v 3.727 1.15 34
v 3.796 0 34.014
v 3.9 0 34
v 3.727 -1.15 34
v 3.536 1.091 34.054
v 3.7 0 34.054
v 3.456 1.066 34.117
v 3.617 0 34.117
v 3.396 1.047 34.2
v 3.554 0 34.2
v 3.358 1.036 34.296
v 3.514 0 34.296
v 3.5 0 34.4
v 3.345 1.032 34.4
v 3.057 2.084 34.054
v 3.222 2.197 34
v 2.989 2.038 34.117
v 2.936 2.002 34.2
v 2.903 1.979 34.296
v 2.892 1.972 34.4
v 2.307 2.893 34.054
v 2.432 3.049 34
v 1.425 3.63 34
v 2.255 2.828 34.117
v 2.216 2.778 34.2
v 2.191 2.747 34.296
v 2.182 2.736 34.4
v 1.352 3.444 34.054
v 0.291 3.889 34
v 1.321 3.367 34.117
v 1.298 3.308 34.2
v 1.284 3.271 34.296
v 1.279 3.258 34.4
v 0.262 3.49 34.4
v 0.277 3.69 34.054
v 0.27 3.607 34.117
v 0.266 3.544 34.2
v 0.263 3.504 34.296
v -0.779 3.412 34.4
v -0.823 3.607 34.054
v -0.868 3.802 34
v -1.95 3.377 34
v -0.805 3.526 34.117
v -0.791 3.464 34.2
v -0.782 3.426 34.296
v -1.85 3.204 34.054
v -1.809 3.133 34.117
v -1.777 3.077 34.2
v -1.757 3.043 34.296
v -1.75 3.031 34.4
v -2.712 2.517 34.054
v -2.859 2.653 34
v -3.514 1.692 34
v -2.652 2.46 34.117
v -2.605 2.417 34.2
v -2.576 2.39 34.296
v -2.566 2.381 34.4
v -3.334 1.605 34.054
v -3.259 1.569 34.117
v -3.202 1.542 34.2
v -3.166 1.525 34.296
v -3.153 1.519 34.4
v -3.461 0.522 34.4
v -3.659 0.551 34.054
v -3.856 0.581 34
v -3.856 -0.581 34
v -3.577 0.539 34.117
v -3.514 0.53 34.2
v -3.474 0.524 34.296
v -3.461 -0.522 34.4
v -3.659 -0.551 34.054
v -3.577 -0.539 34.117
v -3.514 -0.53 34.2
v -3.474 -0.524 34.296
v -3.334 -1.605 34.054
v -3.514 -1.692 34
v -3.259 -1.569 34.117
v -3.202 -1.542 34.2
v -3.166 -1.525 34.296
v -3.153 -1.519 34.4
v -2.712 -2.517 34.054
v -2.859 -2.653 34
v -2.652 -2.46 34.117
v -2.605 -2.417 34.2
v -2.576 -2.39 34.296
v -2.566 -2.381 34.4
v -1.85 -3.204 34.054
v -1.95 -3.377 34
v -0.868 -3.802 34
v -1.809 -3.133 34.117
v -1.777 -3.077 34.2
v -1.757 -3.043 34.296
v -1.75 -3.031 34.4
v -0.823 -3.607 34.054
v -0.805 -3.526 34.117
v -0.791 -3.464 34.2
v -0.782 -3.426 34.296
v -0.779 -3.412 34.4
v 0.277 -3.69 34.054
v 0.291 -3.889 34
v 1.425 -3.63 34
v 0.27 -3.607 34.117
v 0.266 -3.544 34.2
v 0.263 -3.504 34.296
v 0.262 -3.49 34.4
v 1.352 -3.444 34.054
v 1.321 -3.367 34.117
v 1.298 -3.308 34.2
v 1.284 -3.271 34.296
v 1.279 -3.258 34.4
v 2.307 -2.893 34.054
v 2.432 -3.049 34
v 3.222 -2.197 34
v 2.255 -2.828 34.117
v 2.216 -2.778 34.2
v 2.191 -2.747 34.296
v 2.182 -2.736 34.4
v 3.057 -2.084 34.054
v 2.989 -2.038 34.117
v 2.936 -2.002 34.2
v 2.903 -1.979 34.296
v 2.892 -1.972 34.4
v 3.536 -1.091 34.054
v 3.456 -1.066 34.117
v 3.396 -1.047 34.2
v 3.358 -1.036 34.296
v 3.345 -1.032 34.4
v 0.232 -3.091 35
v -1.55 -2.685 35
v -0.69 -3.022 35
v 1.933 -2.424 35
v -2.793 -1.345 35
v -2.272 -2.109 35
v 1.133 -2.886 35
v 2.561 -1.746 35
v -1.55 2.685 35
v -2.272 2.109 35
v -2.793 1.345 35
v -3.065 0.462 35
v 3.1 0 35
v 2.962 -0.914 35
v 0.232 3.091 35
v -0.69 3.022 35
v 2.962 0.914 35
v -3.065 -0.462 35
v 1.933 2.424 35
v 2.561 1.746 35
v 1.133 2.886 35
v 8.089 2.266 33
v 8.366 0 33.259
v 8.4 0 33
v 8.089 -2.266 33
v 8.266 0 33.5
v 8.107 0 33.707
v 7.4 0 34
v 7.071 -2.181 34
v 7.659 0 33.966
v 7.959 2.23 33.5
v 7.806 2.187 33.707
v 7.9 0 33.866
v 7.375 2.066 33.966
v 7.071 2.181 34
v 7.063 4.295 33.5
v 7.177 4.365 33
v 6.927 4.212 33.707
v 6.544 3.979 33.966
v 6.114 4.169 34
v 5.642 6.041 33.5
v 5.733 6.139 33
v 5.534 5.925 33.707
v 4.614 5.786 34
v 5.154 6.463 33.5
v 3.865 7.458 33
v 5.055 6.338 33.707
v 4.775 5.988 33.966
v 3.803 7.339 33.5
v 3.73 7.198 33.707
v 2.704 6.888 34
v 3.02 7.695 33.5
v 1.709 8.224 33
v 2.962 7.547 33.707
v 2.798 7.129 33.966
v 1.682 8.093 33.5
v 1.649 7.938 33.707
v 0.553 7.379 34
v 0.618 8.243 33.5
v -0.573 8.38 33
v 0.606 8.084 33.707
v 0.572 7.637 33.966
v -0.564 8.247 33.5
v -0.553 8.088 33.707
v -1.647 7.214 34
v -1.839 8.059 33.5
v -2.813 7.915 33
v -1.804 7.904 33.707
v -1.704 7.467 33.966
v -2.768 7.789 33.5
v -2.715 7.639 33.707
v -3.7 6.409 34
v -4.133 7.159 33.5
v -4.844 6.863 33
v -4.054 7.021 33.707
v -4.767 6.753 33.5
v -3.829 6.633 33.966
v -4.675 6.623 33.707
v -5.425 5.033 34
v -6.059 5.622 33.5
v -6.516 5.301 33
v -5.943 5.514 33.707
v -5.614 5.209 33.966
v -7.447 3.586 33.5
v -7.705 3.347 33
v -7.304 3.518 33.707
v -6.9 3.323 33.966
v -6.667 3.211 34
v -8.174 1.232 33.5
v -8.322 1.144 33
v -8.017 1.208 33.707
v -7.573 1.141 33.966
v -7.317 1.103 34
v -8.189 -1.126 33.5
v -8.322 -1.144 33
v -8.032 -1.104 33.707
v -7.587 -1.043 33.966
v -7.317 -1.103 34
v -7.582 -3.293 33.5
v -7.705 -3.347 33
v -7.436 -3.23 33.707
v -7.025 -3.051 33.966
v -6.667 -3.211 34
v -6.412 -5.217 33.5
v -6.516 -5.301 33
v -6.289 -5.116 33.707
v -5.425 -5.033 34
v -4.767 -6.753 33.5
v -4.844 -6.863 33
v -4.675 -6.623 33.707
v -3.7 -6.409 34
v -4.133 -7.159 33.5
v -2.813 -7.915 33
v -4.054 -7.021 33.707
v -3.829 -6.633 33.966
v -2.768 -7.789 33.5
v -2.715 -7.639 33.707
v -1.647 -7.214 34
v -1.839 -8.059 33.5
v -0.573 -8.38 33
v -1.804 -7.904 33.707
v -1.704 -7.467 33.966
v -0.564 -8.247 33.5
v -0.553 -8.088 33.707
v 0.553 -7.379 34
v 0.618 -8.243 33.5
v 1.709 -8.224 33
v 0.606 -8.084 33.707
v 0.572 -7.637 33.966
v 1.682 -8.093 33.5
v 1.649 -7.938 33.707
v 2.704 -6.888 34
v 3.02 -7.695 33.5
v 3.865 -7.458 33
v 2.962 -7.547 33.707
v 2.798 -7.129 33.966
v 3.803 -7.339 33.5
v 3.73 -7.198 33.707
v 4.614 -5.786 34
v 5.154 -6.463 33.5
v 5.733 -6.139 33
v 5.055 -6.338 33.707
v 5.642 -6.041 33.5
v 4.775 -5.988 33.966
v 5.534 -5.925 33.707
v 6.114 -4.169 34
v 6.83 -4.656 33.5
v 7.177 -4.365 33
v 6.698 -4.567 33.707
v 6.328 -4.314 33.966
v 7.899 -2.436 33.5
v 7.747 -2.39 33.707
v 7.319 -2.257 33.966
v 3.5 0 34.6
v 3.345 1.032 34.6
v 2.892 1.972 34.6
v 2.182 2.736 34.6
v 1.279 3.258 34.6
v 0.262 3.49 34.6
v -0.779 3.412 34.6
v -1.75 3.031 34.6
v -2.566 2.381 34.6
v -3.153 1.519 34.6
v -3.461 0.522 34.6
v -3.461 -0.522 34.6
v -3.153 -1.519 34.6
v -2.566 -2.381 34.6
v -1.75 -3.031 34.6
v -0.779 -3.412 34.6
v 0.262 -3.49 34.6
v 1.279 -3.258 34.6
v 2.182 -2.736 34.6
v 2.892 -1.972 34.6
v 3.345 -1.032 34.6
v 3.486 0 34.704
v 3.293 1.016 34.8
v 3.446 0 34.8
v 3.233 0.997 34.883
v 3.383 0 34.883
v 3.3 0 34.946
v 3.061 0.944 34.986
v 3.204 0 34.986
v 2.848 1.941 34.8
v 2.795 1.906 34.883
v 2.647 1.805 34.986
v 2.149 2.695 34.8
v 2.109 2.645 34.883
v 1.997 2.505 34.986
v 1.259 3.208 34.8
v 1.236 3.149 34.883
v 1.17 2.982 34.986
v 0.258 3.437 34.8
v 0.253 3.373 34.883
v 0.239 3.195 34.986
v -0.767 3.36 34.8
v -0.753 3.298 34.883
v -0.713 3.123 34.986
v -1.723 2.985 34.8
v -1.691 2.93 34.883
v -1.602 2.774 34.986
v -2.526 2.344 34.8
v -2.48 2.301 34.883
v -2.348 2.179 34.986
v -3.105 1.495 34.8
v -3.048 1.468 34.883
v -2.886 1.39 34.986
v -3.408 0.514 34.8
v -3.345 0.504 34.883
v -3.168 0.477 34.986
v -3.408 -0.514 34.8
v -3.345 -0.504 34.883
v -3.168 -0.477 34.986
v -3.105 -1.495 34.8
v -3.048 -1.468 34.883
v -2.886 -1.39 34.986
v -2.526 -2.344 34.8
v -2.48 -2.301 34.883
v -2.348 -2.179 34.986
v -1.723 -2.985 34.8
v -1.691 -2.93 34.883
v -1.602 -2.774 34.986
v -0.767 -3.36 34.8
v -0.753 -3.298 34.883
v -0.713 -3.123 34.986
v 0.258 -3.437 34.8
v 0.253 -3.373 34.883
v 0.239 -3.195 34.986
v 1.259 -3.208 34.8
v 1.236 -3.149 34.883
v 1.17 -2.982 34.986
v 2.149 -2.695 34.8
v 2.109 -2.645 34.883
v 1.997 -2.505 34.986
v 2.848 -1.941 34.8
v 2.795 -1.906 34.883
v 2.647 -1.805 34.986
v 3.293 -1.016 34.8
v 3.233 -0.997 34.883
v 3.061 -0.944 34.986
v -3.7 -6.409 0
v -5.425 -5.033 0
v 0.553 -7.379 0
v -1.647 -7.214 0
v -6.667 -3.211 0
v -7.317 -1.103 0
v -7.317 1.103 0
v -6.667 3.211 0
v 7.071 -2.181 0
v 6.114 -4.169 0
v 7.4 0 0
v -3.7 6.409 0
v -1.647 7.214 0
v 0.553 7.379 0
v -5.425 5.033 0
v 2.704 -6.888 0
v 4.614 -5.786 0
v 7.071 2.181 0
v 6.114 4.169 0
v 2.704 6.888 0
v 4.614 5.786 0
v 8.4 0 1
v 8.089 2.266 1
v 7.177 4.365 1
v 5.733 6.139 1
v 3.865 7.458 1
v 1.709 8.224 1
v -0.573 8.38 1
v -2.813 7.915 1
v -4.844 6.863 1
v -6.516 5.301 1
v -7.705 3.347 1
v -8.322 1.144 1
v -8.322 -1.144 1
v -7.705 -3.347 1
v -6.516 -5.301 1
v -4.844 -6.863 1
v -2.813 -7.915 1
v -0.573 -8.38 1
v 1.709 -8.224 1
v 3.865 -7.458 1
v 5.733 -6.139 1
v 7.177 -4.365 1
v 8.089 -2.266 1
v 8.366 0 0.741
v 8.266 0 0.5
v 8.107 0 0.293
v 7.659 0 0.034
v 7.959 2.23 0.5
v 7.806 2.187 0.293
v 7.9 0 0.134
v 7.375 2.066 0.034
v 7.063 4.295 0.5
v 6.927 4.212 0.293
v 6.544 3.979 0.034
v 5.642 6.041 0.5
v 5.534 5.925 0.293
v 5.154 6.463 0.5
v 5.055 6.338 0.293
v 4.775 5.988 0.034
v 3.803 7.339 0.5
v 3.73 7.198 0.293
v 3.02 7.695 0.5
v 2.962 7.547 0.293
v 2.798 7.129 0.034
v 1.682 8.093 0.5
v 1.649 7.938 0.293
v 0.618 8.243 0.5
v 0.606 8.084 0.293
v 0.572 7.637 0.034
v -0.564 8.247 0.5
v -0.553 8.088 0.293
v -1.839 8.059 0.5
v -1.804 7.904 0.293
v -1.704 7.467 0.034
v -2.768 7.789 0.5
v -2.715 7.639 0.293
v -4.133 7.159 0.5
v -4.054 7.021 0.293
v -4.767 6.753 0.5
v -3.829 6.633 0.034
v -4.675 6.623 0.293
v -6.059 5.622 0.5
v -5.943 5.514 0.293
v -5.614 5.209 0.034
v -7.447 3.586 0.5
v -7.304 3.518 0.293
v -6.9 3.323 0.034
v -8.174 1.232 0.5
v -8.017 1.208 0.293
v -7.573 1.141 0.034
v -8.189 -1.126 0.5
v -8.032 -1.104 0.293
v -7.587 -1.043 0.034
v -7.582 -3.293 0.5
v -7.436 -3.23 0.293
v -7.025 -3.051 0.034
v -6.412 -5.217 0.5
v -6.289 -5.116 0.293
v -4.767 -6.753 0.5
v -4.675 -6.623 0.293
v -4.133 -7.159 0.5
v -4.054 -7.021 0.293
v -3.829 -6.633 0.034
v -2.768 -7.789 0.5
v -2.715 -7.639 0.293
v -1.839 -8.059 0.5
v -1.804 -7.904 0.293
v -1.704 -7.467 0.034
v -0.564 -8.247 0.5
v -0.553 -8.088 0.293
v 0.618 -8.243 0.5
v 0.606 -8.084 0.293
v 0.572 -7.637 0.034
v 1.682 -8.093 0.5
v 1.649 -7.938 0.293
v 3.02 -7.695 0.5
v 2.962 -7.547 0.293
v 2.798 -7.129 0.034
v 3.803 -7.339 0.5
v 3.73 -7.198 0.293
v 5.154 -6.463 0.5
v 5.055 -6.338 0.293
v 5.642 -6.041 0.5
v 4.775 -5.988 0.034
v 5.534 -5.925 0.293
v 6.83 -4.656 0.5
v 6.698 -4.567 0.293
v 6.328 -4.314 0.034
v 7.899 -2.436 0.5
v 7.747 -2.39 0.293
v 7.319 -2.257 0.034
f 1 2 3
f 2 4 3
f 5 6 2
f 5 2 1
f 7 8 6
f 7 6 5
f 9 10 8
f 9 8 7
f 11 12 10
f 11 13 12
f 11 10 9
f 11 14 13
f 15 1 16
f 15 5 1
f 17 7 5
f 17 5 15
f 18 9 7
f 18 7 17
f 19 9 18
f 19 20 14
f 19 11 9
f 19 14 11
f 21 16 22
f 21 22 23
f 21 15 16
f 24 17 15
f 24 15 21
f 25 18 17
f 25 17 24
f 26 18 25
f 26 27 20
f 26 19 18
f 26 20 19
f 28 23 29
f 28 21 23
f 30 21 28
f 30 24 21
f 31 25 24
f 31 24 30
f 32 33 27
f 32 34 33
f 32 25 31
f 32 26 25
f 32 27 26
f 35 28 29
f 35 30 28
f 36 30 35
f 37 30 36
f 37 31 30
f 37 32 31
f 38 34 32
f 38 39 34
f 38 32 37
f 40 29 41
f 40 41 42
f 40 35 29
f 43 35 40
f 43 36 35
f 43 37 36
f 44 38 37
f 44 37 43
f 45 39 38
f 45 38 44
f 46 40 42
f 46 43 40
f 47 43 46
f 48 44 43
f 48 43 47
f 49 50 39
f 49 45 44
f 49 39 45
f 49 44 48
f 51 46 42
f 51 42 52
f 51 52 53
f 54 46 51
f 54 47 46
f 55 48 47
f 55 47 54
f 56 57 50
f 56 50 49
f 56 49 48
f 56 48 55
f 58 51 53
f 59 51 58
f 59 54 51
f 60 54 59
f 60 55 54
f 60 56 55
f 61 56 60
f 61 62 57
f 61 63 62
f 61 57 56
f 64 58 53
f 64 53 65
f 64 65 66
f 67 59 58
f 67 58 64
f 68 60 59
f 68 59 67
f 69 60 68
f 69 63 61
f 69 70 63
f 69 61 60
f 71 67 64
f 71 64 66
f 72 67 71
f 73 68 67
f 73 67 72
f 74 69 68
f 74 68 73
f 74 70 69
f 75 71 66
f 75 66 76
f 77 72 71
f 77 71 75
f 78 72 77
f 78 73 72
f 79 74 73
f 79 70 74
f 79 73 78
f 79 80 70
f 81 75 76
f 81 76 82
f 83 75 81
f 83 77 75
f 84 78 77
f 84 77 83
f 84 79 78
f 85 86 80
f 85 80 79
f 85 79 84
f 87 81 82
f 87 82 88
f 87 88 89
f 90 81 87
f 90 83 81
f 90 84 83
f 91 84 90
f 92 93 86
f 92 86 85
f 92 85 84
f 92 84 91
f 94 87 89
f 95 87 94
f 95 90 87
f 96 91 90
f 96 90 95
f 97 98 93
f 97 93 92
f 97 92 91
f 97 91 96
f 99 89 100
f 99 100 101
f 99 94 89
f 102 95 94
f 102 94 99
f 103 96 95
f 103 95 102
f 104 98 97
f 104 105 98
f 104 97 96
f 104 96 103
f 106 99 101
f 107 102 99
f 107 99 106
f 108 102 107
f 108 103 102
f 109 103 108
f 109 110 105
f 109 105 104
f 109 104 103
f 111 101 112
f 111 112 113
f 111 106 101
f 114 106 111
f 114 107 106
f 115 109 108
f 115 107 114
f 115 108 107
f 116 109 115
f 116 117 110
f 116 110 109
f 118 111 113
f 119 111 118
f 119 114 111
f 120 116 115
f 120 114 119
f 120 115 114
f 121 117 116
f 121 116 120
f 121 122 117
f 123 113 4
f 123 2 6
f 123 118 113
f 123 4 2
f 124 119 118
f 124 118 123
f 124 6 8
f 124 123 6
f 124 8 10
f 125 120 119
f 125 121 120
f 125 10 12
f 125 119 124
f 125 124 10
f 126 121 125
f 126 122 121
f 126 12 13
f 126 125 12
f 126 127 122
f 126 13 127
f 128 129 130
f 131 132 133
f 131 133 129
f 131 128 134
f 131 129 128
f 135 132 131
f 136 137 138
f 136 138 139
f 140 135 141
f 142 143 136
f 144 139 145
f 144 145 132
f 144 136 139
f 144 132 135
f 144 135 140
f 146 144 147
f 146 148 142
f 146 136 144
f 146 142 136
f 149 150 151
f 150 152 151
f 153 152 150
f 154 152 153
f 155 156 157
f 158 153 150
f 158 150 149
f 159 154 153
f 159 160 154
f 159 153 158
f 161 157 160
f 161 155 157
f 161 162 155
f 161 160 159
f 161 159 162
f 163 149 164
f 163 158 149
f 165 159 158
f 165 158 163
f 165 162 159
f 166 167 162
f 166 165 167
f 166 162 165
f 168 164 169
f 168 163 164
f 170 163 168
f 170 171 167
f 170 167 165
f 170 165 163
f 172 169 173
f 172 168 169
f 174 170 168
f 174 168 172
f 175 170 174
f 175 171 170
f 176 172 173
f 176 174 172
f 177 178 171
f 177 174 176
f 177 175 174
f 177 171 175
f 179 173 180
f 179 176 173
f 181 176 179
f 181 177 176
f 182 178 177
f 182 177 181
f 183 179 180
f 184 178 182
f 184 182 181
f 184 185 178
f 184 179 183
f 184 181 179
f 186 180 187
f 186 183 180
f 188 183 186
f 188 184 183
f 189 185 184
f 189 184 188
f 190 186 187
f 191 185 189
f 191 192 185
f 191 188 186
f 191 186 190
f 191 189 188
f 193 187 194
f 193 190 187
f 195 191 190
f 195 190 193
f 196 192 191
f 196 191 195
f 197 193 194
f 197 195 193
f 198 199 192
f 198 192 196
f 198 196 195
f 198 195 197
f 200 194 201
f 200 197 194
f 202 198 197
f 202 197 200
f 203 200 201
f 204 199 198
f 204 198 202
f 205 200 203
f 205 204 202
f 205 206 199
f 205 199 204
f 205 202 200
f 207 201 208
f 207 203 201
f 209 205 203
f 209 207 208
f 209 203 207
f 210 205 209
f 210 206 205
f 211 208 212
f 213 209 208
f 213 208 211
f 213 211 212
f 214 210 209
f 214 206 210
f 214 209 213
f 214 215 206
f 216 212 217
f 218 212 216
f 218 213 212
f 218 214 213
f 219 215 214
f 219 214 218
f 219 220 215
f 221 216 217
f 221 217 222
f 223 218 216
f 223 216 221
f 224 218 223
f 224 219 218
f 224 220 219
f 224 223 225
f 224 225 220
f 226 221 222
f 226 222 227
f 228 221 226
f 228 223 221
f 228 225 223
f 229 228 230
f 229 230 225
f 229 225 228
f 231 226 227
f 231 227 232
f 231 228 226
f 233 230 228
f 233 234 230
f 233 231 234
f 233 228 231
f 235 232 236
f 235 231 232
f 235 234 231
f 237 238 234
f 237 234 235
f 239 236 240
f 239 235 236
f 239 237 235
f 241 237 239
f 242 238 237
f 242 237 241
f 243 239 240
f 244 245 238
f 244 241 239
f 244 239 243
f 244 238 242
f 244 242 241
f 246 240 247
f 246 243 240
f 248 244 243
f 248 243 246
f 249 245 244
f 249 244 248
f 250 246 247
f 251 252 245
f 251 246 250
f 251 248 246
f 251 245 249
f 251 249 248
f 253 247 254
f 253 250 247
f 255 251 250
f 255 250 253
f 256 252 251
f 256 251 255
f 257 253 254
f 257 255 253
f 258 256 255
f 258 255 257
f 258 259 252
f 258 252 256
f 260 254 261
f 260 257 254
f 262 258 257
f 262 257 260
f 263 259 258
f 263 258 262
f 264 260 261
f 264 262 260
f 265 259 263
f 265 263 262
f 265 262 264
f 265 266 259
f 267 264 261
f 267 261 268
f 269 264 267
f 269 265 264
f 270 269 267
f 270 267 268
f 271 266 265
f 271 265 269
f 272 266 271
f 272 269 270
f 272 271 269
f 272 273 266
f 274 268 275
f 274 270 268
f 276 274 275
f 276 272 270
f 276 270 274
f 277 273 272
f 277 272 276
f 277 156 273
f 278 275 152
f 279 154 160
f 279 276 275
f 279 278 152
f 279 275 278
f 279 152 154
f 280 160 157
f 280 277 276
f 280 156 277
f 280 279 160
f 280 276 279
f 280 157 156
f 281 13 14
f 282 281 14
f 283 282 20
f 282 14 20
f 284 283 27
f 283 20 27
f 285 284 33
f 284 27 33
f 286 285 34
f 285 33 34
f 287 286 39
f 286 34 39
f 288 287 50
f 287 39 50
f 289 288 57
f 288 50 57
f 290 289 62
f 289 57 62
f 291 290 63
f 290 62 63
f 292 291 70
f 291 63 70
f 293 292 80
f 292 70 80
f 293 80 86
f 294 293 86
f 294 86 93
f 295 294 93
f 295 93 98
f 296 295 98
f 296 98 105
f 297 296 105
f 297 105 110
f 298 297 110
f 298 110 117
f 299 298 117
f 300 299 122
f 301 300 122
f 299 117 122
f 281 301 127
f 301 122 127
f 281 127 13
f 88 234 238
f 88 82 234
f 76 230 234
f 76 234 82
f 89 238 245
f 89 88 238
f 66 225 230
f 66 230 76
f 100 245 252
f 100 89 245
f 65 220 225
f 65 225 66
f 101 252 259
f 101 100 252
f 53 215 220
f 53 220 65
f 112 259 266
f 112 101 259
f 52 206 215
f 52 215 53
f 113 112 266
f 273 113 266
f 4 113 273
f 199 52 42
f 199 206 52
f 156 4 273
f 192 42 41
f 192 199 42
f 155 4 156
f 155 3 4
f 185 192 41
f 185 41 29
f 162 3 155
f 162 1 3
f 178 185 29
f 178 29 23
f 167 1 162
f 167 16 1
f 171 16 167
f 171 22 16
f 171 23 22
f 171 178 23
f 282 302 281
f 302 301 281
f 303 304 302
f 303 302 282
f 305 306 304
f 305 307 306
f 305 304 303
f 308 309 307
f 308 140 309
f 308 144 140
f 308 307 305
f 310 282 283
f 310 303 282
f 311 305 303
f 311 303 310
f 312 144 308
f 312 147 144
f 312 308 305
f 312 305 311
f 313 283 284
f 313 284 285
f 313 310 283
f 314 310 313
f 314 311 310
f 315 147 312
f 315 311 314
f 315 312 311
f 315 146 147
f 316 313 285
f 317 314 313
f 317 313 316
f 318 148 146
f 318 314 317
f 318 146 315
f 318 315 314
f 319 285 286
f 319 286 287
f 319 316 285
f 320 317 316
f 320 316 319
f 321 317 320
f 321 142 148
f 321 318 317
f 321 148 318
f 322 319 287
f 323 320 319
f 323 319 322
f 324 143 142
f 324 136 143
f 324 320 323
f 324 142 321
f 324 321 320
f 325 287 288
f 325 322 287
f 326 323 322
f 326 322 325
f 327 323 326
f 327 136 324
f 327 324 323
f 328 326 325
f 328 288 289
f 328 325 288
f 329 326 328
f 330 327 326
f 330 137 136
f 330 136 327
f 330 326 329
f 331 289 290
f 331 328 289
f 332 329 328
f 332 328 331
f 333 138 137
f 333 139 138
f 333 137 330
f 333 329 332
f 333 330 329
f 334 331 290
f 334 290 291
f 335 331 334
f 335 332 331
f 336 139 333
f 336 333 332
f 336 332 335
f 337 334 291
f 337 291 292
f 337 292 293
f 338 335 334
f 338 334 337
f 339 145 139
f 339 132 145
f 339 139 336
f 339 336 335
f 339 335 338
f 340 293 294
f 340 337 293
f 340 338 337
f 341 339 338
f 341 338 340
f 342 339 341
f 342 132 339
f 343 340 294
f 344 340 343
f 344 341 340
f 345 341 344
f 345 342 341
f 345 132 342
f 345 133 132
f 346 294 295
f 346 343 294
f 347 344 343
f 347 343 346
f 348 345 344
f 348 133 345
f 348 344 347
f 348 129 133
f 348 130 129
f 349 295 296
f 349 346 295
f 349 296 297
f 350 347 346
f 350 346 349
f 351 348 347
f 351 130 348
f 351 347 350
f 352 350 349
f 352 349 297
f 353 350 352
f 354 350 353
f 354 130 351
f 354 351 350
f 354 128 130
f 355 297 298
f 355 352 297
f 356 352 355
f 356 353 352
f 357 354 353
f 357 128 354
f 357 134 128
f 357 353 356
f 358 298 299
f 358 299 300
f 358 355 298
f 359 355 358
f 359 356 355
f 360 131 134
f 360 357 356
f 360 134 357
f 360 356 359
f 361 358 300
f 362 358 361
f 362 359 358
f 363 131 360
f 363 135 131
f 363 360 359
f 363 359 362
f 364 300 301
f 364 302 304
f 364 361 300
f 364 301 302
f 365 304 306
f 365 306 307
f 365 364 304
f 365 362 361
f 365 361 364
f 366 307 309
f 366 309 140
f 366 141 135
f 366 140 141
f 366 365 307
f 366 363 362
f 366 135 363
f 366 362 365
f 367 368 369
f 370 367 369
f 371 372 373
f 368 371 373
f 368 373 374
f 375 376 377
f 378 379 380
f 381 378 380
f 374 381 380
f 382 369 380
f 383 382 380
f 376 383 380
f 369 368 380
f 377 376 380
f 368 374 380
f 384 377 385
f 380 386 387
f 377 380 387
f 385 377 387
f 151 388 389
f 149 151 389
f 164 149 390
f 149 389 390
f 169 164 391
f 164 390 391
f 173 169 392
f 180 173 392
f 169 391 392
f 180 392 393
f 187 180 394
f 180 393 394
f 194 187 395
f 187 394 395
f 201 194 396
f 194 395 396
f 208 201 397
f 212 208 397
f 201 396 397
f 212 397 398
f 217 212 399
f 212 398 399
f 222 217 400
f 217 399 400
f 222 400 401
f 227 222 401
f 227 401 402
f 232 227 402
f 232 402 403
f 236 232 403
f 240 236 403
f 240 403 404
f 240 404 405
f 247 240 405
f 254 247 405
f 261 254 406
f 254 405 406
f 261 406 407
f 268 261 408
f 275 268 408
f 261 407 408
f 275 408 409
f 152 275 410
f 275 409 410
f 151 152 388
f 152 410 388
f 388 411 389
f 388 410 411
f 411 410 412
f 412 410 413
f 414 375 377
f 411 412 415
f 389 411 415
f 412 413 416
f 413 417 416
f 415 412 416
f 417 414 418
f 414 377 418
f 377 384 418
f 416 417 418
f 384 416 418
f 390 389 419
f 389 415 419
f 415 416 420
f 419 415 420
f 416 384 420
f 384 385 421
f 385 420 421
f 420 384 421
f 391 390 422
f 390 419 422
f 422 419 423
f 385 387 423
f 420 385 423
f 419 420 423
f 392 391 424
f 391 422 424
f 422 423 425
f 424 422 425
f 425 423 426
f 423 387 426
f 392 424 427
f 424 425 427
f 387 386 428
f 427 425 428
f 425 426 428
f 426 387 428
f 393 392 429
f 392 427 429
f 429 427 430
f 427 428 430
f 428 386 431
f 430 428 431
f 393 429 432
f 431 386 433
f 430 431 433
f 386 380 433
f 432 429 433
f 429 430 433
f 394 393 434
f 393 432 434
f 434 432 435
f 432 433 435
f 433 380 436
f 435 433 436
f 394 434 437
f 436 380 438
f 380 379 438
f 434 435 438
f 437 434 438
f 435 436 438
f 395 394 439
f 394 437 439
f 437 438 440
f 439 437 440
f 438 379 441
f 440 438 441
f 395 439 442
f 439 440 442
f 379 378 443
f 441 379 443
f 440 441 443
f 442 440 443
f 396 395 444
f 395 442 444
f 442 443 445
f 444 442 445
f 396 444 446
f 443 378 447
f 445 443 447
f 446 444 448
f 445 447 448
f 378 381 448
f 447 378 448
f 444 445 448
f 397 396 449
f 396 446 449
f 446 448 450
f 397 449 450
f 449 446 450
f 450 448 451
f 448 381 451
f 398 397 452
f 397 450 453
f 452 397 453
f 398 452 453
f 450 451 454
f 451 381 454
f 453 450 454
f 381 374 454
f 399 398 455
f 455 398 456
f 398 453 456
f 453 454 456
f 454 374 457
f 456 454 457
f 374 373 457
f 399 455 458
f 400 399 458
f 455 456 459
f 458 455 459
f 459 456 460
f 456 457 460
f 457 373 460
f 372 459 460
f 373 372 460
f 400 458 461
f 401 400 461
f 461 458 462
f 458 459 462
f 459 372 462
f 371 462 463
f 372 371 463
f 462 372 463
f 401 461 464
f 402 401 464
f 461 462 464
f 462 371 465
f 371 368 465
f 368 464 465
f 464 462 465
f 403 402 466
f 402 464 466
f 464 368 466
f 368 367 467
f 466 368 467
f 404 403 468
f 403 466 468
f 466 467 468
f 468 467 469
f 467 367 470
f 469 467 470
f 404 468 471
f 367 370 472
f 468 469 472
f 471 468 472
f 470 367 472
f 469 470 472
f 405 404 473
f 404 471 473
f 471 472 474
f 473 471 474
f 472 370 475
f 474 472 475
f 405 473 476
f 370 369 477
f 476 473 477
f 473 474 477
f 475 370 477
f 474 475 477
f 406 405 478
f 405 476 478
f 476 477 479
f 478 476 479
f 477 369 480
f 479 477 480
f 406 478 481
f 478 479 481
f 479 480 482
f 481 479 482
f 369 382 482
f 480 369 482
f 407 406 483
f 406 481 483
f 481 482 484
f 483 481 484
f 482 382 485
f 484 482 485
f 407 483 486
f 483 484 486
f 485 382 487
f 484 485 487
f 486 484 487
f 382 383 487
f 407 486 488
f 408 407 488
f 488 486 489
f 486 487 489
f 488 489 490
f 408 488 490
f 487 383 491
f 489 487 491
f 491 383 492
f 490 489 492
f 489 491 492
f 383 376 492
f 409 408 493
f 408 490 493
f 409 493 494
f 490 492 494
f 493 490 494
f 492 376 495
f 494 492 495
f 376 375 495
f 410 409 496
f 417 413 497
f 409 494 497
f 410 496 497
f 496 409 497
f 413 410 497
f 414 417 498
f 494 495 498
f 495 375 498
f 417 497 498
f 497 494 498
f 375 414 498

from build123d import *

# Parameters (mm, degrees)
SKETCH1_R           = 8.4
BOSS_EXTRUDE1_DEPTH = 34
SKETCH2_R           = 3.5
BOSS_EXTRUDE2_DEPTH = 1
FILLET1_R           = 1
FILLET2_R           = 0.4


with BuildPart() as part:
    # Sketch1 → Boss-Extrude1 (new body)
    with BuildSketch(Plane.XY):
        Circle(SKETCH1_R)
    extrude(amount=BOSS_EXTRUDE1_DEPTH)

    # Sketch2 → Boss-Extrude2 (add)
    with BuildSketch(Plane.XY.offset(34)):
        Circle(SKETCH2_R)
    extrude(amount=BOSS_EXTRUDE2_DEPTH)

    # Fillet1
    fillet1_edges = [part.edges().sort_by_distance(p)[0] for p in [
        (-8.4, 0, 0),
        (-8.4, 0, 34),
    ]]
    fillet(fillet1_edges, radius=FILLET1_R)

    # Fillet2
    fillet2_edges = [part.edges().sort_by_distance(p)[0] for p in [
        (-3.5, 0, 34),
        (-3.5, 0, 35),
    ]]
    fillet(fillet2_edges, radius=FILLET2_R)


solid = part.part
